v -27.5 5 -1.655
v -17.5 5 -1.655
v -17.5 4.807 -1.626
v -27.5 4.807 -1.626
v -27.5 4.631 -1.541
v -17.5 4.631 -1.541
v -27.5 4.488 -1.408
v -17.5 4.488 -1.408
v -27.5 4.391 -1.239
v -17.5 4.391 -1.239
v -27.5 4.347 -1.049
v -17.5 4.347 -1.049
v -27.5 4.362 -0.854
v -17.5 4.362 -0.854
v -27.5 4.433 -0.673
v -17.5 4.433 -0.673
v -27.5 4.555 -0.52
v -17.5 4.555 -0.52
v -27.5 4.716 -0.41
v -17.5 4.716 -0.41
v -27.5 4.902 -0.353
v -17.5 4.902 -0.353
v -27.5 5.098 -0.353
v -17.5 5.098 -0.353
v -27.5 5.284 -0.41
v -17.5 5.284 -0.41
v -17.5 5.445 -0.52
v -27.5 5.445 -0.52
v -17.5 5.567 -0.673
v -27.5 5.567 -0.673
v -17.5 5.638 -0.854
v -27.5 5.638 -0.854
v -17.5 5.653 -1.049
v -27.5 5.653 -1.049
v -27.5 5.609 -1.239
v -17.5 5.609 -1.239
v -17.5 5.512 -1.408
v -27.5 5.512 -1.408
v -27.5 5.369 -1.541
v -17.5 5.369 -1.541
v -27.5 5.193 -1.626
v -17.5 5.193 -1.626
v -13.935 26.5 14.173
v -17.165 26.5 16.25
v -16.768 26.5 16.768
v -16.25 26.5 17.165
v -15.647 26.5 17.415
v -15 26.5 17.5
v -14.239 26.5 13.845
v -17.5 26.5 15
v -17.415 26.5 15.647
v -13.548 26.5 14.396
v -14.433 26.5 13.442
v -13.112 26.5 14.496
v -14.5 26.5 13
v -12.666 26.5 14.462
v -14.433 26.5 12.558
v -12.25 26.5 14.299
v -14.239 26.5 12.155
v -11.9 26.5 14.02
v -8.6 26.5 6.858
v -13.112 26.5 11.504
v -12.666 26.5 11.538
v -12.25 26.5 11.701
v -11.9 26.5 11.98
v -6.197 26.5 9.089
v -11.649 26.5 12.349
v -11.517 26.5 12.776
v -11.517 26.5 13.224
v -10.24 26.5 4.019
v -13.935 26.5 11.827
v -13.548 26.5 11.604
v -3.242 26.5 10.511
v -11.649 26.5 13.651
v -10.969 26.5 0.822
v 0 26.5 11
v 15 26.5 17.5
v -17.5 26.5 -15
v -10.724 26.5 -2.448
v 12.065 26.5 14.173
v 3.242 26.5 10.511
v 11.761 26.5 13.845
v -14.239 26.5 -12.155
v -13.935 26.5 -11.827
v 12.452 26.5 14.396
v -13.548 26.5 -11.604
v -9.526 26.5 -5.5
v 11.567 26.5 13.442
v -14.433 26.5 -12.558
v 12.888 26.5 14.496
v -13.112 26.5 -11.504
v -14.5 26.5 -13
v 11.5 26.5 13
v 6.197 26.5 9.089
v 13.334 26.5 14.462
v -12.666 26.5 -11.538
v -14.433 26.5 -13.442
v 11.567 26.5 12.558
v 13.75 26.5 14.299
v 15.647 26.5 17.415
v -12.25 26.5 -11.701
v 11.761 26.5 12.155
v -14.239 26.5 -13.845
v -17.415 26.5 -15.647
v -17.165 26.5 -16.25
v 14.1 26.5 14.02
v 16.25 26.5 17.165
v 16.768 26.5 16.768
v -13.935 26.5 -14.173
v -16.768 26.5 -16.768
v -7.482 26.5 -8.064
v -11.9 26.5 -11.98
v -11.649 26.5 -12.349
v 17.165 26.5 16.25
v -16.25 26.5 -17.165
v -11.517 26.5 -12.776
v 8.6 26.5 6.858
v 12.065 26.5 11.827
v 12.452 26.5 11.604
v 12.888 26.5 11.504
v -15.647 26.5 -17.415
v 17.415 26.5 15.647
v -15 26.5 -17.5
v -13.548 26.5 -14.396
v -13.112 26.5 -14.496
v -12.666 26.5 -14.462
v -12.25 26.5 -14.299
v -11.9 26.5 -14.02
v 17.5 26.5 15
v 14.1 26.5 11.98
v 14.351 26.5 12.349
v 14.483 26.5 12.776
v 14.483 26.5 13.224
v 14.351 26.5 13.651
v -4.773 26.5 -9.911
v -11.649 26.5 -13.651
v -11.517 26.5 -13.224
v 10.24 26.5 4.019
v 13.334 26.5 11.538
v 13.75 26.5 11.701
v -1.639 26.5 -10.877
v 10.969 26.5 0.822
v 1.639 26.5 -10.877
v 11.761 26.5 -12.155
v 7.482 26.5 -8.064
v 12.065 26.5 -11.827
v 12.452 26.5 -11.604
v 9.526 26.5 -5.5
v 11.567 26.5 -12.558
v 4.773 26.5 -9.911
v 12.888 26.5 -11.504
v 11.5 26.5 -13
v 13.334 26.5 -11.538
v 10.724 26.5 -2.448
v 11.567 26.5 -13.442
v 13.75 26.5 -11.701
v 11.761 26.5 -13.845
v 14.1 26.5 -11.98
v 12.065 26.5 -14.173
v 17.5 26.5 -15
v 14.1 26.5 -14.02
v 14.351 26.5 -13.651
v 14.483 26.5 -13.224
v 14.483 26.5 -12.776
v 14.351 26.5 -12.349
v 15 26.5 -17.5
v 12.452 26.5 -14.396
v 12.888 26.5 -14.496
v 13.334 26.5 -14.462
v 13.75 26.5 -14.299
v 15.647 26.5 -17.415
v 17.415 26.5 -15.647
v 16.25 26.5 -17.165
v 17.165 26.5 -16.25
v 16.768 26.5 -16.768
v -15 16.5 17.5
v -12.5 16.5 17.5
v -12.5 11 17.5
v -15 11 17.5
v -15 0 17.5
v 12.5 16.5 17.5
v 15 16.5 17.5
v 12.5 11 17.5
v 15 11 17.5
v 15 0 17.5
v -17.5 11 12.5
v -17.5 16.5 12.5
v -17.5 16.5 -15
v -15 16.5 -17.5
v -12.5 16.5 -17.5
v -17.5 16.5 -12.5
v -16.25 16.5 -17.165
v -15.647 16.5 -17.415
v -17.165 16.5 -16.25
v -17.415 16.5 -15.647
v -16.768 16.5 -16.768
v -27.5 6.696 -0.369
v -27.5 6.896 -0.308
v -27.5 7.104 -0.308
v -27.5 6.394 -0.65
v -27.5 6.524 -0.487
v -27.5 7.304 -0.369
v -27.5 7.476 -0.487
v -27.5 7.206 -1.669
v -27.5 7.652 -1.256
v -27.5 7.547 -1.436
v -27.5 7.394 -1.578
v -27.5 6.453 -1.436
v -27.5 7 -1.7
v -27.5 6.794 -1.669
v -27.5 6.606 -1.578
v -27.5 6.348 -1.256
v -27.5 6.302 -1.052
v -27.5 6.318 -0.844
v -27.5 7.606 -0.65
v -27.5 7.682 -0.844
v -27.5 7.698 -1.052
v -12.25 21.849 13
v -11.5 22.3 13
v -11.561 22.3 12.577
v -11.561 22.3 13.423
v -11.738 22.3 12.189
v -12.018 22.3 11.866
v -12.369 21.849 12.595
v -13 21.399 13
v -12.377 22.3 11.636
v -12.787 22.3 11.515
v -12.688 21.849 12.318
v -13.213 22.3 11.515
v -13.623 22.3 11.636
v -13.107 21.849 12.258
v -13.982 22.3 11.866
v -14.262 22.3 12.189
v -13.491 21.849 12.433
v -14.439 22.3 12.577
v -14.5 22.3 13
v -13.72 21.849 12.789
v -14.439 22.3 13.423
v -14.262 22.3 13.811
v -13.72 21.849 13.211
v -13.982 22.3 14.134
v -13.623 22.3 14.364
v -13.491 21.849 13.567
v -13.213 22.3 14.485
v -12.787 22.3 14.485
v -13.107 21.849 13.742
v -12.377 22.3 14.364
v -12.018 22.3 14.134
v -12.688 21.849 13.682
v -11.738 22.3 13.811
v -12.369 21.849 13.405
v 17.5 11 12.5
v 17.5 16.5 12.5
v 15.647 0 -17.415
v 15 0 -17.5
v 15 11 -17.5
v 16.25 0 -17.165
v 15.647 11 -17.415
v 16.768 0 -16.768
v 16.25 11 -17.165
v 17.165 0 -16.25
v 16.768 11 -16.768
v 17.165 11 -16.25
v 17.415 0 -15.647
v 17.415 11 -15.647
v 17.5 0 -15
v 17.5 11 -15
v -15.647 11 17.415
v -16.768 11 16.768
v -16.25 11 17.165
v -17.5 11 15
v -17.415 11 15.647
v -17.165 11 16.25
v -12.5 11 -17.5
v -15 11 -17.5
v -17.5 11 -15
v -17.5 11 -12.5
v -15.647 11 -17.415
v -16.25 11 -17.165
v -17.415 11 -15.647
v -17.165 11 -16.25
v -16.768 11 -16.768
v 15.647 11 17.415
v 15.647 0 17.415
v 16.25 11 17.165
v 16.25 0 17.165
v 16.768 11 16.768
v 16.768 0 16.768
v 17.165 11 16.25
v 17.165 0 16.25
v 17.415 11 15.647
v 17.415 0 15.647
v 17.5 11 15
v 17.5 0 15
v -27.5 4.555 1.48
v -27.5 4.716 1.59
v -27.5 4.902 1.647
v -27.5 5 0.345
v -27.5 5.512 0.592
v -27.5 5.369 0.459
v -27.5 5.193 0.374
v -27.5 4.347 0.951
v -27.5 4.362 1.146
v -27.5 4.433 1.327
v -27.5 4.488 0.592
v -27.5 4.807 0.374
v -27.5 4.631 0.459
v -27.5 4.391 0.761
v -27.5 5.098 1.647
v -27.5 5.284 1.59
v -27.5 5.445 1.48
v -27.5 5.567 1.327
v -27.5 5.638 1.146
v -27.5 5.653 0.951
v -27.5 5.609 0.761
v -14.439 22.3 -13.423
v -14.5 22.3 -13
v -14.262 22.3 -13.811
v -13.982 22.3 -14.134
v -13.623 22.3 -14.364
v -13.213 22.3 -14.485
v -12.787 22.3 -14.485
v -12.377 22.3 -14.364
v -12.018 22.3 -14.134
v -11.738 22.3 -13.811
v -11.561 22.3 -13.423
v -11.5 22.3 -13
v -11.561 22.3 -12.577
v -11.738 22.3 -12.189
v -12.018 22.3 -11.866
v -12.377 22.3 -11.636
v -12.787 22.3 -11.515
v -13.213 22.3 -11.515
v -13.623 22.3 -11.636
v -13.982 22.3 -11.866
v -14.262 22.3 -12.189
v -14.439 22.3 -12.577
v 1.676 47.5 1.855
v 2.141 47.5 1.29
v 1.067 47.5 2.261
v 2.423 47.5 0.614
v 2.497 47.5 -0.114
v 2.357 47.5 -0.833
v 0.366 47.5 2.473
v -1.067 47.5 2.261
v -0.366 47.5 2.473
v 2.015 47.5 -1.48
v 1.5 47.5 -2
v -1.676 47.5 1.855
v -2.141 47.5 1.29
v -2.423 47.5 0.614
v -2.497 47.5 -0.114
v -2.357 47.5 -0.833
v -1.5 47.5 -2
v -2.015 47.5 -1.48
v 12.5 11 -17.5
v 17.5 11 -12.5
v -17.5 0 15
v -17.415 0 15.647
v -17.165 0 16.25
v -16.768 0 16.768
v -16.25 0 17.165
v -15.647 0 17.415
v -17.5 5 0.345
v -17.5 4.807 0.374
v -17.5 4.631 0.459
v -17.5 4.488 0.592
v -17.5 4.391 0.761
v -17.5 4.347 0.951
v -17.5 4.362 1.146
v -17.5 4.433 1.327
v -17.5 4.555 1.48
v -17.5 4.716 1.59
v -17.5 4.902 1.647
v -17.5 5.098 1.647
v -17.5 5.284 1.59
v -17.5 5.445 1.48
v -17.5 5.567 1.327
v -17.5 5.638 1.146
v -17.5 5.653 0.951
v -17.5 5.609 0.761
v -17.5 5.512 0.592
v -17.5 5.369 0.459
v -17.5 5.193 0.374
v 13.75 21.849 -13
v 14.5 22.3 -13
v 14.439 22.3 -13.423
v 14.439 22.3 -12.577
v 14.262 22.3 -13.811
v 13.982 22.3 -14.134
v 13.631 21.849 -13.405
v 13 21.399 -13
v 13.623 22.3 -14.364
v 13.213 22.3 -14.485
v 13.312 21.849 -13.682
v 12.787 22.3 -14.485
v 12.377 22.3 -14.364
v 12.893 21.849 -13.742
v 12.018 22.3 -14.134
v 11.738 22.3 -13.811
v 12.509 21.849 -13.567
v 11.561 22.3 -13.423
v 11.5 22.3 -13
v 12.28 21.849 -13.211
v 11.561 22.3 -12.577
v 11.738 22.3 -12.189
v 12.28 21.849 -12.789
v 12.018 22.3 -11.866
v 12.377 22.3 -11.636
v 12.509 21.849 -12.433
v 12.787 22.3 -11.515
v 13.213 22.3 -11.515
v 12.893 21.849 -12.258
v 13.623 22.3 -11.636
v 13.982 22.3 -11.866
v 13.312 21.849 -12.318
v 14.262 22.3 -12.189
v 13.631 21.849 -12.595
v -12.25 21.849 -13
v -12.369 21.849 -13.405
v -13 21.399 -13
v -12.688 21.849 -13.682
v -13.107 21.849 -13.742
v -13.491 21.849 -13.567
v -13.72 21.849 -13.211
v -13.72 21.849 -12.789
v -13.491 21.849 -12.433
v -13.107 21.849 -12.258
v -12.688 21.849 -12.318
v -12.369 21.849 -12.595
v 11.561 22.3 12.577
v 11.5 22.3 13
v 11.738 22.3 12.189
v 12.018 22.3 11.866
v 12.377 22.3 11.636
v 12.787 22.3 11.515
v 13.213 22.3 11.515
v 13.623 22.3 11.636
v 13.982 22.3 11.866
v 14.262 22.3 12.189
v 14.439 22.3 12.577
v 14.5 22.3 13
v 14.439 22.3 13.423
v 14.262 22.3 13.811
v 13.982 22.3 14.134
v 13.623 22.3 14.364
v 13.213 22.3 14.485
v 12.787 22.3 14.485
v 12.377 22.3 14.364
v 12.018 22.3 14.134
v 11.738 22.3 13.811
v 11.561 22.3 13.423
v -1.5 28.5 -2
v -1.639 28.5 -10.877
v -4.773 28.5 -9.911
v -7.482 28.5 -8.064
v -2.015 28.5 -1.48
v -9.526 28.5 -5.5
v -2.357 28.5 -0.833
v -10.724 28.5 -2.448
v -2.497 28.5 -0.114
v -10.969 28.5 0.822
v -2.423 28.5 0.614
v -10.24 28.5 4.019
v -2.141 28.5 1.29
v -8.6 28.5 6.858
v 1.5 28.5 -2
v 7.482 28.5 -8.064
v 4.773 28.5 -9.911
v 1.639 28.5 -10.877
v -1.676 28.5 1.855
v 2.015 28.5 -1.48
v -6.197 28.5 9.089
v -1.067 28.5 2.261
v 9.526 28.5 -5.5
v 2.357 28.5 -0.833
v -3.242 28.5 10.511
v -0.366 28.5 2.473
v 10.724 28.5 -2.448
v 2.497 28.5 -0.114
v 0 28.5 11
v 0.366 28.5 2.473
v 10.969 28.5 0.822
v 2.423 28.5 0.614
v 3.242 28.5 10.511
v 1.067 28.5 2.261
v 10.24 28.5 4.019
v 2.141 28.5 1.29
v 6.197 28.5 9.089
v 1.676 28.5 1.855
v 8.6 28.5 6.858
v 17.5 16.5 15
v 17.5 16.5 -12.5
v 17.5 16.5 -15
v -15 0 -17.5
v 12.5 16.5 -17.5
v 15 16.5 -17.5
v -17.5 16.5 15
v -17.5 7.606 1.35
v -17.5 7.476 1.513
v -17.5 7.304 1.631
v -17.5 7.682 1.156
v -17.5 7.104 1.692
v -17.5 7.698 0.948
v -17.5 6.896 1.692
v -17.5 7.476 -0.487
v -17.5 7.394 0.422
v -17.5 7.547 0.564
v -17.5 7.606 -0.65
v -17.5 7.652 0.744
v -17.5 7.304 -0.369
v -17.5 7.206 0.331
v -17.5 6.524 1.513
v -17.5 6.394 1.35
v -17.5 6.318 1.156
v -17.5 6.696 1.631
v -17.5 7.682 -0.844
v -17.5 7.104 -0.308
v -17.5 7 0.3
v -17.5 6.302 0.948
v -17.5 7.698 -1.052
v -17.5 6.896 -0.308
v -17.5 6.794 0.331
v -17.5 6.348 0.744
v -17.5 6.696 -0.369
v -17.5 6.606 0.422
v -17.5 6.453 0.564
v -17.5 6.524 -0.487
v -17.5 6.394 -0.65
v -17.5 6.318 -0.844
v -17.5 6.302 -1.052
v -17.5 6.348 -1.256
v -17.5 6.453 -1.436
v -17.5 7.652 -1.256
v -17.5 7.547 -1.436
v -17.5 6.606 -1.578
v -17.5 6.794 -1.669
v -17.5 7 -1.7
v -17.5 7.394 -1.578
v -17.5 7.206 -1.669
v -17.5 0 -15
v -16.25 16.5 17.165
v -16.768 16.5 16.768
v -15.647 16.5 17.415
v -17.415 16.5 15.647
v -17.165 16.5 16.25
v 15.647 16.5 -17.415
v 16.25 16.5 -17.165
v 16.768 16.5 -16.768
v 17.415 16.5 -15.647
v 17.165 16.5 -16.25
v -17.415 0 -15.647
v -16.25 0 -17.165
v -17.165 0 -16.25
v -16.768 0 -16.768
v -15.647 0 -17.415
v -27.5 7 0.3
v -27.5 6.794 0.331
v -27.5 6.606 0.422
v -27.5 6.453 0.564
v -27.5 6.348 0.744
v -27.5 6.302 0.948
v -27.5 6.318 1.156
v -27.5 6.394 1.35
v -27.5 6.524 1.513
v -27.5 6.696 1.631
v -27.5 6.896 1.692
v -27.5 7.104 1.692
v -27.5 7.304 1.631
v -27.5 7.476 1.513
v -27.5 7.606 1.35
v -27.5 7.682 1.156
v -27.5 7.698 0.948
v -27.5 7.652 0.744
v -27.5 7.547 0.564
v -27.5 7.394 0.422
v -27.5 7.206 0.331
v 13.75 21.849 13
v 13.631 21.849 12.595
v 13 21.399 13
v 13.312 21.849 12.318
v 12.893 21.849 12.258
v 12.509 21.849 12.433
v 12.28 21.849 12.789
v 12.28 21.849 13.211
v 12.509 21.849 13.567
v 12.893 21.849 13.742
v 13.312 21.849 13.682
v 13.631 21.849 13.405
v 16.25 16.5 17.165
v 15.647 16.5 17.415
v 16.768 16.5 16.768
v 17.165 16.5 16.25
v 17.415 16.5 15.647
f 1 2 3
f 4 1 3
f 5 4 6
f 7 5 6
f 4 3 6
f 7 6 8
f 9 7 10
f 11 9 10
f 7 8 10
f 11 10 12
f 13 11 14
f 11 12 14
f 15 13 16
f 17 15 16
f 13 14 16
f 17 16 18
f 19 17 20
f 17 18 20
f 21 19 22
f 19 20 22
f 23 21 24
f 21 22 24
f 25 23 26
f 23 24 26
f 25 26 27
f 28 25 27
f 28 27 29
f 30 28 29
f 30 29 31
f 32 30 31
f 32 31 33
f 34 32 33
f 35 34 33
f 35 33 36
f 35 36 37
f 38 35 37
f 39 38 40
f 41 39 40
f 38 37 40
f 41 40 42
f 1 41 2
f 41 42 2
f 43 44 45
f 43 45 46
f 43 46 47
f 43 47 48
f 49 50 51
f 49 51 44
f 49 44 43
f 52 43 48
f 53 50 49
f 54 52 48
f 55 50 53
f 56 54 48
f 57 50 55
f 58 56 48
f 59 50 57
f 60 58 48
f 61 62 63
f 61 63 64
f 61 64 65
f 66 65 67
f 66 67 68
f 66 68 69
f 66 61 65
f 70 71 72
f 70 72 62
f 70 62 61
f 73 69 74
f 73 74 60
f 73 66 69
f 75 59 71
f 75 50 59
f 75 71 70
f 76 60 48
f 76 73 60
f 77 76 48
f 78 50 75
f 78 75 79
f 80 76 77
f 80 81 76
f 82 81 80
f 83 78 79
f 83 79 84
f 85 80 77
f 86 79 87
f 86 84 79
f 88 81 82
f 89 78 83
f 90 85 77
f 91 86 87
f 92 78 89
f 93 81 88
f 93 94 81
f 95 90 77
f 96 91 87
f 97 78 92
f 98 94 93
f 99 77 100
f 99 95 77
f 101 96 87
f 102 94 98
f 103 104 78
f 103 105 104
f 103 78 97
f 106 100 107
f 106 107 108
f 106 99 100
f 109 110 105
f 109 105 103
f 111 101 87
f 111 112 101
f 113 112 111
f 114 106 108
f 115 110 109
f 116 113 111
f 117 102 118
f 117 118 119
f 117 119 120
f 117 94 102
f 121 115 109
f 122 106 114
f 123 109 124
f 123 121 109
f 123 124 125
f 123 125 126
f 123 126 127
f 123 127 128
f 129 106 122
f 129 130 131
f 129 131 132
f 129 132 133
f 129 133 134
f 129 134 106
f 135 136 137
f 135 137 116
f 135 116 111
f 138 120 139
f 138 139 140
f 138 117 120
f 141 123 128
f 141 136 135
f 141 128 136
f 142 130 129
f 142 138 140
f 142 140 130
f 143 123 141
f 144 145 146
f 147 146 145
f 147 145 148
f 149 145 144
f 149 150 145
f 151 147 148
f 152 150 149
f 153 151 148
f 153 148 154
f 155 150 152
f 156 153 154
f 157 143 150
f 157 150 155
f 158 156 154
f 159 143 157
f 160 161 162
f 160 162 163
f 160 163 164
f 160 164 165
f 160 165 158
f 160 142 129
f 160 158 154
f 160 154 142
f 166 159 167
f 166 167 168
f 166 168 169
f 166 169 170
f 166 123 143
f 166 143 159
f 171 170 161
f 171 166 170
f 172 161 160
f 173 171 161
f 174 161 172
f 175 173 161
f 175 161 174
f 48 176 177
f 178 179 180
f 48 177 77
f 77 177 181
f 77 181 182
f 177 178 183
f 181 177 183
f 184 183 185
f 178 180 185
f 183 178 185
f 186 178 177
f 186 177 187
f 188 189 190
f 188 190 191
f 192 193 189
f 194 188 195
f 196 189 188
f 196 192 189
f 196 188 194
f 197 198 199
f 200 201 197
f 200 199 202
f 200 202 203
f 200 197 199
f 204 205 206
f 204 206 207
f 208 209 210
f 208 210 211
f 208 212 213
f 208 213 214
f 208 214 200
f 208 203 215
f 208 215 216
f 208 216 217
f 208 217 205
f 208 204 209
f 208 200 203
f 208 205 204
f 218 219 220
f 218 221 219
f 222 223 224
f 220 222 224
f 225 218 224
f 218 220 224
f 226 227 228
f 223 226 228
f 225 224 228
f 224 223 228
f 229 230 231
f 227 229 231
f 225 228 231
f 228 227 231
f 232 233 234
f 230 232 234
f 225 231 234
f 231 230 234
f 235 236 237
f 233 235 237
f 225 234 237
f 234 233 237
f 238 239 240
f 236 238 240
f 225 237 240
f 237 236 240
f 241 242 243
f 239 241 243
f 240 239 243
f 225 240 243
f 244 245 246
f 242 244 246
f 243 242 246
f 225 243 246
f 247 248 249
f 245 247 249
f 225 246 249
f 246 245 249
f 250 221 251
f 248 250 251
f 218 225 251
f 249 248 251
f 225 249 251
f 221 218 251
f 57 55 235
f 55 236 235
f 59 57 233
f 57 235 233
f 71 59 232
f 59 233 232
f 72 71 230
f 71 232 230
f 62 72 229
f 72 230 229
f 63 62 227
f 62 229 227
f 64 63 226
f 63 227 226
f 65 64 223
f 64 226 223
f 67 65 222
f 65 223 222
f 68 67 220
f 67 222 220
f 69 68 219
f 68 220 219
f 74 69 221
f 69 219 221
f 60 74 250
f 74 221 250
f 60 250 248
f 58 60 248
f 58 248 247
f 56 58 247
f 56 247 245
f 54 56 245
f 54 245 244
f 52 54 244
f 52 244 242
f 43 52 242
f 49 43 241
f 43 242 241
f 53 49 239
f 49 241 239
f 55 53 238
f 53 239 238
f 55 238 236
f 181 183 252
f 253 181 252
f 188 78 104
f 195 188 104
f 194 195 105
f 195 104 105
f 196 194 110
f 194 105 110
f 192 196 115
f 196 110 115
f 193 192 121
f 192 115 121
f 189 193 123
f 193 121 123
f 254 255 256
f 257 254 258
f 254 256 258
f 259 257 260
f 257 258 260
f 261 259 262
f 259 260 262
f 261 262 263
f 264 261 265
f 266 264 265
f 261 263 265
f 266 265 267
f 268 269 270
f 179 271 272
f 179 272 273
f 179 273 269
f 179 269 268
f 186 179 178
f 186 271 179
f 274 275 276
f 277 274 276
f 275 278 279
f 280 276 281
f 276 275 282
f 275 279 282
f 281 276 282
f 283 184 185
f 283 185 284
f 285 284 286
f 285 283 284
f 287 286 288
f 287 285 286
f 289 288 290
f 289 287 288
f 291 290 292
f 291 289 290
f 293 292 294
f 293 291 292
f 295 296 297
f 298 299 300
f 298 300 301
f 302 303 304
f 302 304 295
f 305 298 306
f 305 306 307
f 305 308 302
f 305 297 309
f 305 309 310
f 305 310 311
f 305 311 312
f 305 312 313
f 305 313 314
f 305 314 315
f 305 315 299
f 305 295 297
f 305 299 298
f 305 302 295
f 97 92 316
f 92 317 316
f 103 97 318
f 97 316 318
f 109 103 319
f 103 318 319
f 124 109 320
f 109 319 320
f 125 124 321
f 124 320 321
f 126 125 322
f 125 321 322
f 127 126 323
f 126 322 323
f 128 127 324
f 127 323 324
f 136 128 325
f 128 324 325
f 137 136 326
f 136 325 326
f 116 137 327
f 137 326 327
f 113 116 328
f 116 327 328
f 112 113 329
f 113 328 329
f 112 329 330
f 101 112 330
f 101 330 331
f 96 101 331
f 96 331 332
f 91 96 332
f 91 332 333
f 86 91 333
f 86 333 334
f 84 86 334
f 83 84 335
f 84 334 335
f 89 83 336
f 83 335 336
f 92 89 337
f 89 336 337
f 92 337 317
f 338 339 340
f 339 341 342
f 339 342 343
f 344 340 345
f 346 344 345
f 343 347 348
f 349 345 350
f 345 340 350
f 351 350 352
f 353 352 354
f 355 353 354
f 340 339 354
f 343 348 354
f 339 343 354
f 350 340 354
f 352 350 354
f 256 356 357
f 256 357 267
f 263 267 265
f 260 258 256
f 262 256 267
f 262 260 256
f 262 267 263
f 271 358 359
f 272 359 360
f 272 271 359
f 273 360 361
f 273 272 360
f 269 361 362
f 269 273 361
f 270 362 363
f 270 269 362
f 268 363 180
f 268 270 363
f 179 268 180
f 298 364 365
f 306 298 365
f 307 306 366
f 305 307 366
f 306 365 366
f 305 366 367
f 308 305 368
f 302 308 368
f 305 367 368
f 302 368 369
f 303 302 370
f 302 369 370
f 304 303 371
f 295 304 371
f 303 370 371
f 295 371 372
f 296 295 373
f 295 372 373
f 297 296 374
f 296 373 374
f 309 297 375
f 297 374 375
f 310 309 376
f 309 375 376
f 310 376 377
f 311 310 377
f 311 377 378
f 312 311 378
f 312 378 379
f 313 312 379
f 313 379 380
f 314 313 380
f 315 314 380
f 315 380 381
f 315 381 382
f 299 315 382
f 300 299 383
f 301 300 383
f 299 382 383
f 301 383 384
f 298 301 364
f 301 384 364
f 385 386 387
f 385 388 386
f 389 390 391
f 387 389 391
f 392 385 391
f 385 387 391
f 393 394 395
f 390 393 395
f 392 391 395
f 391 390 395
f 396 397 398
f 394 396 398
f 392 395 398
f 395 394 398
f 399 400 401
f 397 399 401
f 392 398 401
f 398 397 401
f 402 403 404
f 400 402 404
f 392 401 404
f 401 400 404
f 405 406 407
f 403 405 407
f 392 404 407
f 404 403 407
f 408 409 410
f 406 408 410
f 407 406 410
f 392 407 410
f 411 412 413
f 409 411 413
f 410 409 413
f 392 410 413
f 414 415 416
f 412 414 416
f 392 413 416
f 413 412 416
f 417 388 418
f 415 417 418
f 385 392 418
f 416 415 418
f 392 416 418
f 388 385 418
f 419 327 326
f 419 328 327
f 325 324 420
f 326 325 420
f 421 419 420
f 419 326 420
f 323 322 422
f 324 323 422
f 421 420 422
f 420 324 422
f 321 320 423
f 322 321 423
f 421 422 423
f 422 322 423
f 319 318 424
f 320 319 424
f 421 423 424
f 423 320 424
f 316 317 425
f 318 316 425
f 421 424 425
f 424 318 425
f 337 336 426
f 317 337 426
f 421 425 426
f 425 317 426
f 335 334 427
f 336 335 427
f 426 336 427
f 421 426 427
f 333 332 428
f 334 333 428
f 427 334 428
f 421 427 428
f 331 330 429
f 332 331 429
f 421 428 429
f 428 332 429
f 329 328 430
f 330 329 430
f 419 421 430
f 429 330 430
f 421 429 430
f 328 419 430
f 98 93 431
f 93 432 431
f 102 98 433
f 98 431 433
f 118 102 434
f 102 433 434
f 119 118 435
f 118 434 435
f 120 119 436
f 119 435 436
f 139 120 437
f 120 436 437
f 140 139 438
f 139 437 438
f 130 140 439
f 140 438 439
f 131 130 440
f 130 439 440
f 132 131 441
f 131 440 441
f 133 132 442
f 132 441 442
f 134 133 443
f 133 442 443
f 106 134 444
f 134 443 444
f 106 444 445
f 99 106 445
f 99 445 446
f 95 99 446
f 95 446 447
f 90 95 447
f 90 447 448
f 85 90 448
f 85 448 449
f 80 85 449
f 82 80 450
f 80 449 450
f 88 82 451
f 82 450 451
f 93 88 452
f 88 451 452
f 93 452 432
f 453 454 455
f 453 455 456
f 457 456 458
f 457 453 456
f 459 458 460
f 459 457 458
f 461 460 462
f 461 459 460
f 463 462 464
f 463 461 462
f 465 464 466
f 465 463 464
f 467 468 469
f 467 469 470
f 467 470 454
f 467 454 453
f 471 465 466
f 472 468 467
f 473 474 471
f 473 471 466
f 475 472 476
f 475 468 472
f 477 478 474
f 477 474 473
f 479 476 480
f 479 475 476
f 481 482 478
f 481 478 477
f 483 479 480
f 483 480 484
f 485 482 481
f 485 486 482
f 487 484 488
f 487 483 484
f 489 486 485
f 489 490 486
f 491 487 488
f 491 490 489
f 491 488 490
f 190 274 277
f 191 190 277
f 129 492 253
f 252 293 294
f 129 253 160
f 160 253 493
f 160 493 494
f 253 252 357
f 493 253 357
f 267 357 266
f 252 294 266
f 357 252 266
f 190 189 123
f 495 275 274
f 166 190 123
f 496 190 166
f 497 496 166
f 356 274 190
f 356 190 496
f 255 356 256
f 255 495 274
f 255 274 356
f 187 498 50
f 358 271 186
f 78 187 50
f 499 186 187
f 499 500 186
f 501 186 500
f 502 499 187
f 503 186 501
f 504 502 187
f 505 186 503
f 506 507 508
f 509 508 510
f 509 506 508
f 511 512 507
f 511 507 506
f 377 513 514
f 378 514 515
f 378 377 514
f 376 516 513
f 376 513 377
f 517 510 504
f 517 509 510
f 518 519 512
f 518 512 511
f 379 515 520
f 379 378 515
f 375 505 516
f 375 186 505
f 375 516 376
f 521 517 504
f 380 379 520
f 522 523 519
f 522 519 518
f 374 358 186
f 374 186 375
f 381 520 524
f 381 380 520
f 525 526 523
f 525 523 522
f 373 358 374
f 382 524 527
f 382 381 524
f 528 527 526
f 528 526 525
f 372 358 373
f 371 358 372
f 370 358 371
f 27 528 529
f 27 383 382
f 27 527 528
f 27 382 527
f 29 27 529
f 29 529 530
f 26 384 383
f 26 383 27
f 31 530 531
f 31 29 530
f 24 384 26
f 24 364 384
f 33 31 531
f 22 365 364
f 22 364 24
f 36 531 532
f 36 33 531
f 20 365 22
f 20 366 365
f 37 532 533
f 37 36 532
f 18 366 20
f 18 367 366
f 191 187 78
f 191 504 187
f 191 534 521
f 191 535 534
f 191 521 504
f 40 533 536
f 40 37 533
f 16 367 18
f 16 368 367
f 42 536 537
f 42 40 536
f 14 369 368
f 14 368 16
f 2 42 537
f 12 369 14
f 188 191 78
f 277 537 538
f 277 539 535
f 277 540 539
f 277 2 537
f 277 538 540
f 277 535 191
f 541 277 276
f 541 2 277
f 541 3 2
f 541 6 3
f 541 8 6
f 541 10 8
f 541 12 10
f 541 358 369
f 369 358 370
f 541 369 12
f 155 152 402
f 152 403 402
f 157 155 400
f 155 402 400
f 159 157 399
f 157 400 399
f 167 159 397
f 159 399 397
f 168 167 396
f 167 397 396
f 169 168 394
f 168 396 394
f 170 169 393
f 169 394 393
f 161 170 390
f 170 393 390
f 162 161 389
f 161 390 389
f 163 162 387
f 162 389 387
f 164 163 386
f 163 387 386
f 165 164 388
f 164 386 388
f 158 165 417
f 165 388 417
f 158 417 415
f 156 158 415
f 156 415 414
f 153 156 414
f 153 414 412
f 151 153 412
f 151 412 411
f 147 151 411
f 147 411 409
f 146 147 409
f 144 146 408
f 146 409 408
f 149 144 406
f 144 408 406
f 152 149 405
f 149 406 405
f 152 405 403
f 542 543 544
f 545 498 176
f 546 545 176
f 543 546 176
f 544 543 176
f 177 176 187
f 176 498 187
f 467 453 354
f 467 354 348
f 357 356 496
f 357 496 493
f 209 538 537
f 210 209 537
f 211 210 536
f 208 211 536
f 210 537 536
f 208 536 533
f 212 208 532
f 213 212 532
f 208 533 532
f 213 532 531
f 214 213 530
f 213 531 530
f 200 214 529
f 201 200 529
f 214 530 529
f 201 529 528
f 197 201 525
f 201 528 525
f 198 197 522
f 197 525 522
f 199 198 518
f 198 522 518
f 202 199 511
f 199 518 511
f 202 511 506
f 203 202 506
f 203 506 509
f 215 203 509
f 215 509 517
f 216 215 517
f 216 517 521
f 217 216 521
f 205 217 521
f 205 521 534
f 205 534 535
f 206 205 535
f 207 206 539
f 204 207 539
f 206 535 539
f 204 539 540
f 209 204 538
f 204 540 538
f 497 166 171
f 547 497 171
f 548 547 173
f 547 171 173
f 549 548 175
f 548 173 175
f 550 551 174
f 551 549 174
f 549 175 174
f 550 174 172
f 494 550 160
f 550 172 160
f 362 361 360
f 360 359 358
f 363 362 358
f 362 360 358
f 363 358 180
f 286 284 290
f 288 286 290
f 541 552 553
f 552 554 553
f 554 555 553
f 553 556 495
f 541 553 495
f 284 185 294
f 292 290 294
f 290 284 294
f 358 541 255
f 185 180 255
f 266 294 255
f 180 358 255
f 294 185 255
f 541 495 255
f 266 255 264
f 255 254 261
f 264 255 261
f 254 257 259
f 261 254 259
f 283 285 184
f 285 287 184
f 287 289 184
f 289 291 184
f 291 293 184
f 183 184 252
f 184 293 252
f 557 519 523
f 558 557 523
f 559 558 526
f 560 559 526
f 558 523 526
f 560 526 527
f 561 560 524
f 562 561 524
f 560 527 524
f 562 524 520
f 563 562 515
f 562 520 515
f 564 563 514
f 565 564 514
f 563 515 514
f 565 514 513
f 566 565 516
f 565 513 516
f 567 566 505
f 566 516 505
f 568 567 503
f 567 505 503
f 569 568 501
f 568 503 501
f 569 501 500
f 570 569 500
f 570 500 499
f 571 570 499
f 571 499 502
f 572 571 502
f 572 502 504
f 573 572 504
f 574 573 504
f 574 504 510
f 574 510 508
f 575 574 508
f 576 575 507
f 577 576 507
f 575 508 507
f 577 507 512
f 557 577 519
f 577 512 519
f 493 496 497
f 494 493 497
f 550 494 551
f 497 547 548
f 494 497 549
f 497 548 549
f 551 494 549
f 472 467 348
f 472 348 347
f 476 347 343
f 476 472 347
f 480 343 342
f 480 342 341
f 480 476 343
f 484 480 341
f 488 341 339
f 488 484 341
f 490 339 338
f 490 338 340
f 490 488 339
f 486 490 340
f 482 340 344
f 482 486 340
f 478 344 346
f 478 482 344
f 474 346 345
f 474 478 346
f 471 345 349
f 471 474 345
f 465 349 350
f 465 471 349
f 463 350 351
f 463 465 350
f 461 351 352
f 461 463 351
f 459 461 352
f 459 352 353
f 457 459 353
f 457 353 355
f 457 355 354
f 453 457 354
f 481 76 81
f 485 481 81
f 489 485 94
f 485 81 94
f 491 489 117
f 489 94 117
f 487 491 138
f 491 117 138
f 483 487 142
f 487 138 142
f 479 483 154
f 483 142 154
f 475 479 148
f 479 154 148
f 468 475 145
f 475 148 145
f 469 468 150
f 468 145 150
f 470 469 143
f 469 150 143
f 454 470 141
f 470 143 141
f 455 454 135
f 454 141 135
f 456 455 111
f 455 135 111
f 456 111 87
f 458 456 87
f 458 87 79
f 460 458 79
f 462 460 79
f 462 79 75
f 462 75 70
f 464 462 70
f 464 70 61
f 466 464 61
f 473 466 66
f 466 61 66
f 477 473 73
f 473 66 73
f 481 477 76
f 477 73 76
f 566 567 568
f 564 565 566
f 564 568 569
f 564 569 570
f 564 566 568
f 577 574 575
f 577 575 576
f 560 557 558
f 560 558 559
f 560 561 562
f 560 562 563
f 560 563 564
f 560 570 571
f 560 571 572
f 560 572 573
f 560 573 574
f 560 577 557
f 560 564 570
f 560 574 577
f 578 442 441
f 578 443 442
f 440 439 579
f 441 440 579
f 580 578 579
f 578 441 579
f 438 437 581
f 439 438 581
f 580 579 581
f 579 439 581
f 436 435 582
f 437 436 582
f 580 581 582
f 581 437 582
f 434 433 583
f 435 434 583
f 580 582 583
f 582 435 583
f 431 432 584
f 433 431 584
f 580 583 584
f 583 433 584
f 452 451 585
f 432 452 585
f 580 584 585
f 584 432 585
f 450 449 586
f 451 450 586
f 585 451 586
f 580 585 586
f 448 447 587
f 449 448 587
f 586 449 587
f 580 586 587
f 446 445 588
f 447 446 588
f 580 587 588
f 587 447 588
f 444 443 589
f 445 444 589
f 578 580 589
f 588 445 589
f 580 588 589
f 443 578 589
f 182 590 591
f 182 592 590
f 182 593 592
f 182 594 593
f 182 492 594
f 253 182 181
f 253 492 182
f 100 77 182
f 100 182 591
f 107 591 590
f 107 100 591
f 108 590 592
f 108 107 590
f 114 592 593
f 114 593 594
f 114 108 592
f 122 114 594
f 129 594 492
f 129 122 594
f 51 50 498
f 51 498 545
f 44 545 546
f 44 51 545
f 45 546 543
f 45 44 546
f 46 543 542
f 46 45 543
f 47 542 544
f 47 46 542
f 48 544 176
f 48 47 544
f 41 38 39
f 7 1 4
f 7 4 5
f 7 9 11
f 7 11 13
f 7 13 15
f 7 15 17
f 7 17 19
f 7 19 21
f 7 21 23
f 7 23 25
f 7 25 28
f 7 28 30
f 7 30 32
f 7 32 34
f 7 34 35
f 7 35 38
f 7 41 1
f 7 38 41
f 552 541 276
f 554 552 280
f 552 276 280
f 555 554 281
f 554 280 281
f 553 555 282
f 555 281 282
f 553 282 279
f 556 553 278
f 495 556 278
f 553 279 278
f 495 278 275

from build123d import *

# Parameters (mm, degrees)
ESQUISSE1_W                       = 35
ESQUISSE1_H                       = 35
BOSS_EXTRU_1_DEPTH                = 26.5
ESQUISSE2_R                       = 11
BOSS_EXTRU_2_DEPTH                = 2
BOSS_EXTRU_3_DEPTH                = 19
DIAM_TRE_DU_PER_AGE_3_0_3_1_D     = 3
DIAM_TRE_DU_PER_AGE_3_0_3_1_DEPTH = 4.2
DIAM_TRE_DU_PER_AGE_3_0_3_1_TIP   = 0.901290929
CONG_1_R                          = 2.5
ENL_V_START                       = 11
ENL_V_MAT_EXTRU_1_DEPTH           = 5.5
ESQUISSE5_R                       = 0.7
ESQUISSE5_R_2                     = 0.654723083
BOSS_EXTRU_4_DEPTH                = 10


with BuildPart() as part:
    # Esquisse1 → Boss.-Extru.1 (new body)
    with BuildSketch(Plane(origin=(0, 0, 0), x_dir=(1, 0, 0), z_dir=(0, 1, 0))):
        Rectangle(ESQUISSE1_W, ESQUISSE1_H)
    extrude(amount=BOSS_EXTRU_1_DEPTH)

    # Esquisse2 → Boss.-Extru.2 (add)
    with BuildSketch(Plane(origin=(0, 26.5, 0), x_dir=(1, 0, 0), z_dir=(0, 1, 0))):
        with Locations(Location((0, 0, 0), (0, 0, 270))):
            Circle(ESQUISSE2_R)
    extrude(amount=BOSS_EXTRU_2_DEPTH)

    # Esquisse3 → Boss.-Extru.3 (add)
    with BuildSketch(Plane(origin=(0, 28.5, 0), x_dir=(1, 0, 0), z_dir=(0, 1, 0))):
        with BuildLine():
            Line((-1.5, 2), (1.5, 2))
            ThreePointArc((1.5, 2), (0, -2.5), (-1.5, 2))
        make_face()
    extrude(amount=BOSS_EXTRU_3_DEPTH)

    # Diamètre du perçage Ø3.0 (3)1
    with Locations(Plane(origin=(0, 26.5, 0), x_dir=(1, 0, 0), z_dir=(0, 1, 0))):
        with Locations((-13, 13), (13, 13), (13, -13), (-13, -13)):
            Hole(DIAM_TRE_DU_PER_AGE_3_0_3_1_D / 2, depth=DIAM_TRE_DU_PER_AGE_3_0_3_1_DEPTH)
            with Locations((0, 0, -(DIAM_TRE_DU_PER_AGE_3_0_3_1_DEPTH + DIAM_TRE_DU_PER_AGE_3_0_3_1_TIP / 2))):  # 118° drill point
                Cone(0, DIAM_TRE_DU_PER_AGE_3_0_3_1_D / 2, DIAM_TRE_DU_PER_AGE_3_0_3_1_TIP, mode=Mode.SUBTRACT)

    # Congé1
    cong_1_edges = [part.edges().sort_by_distance(p)[0] for p in [
        (-17.5, 13.25, -17.5),
        (17.5, 13.25, -17.5),
        (17.5, 13.25, 17.5),
        (-17.5, 13.25, 17.5),
    ]]
    fillet(cong_1_edges, radius=CONG_1_R)

    # Esquisse4 → Enlèv. mat.-Extru.1 (cut)
    with BuildSketch(Plane(origin=(0, 0, 0), x_dir=(1, 0, 0), z_dir=(0, 1, 0)).offset(ENL_V_START)):
        Polygon((-12.5, 17.5), (-17.5, 12.5), (-17.5, 17.5), align=None)
        Polygon((17.5, 17.5), (12.5, 17.5), (17.5, 12.5), align=None)
        Polygon((12.5, -17.5), (17.5, -12.5), (17.5, -17.5), align=None)
        Polygon((-17.5, -17.5), (-12.5, -17.5), (-17.5, -12.5), align=None)
    extrude(amount=ENL_V_MAT_EXTRU_1_DEPTH, mode=Mode.SUBTRACT)

    # Esquisse5 → Boss.-Extru.4 (add)
    with BuildSketch(Plane.ZY.offset(17.5)):
        with Locations(Location((-1, 7, 0), (0, 0, 180))):
            Circle(ESQUISSE5_R)
        with Locations(Location((-1, 5, 0), (0, 0, 180))):
            Circle(ESQUISSE5_R_2)
        with Locations(Location((1, 5, 0), (0, 0, 180))):
            Circle(ESQUISSE5_R_2)
        with Locations(Location((1, 7, 0), (0, 0, 180))):
            Circle(ESQUISSE5_R)
    extrude(amount=BOSS_EXTRU_4_DEPTH)


solid = part.part
